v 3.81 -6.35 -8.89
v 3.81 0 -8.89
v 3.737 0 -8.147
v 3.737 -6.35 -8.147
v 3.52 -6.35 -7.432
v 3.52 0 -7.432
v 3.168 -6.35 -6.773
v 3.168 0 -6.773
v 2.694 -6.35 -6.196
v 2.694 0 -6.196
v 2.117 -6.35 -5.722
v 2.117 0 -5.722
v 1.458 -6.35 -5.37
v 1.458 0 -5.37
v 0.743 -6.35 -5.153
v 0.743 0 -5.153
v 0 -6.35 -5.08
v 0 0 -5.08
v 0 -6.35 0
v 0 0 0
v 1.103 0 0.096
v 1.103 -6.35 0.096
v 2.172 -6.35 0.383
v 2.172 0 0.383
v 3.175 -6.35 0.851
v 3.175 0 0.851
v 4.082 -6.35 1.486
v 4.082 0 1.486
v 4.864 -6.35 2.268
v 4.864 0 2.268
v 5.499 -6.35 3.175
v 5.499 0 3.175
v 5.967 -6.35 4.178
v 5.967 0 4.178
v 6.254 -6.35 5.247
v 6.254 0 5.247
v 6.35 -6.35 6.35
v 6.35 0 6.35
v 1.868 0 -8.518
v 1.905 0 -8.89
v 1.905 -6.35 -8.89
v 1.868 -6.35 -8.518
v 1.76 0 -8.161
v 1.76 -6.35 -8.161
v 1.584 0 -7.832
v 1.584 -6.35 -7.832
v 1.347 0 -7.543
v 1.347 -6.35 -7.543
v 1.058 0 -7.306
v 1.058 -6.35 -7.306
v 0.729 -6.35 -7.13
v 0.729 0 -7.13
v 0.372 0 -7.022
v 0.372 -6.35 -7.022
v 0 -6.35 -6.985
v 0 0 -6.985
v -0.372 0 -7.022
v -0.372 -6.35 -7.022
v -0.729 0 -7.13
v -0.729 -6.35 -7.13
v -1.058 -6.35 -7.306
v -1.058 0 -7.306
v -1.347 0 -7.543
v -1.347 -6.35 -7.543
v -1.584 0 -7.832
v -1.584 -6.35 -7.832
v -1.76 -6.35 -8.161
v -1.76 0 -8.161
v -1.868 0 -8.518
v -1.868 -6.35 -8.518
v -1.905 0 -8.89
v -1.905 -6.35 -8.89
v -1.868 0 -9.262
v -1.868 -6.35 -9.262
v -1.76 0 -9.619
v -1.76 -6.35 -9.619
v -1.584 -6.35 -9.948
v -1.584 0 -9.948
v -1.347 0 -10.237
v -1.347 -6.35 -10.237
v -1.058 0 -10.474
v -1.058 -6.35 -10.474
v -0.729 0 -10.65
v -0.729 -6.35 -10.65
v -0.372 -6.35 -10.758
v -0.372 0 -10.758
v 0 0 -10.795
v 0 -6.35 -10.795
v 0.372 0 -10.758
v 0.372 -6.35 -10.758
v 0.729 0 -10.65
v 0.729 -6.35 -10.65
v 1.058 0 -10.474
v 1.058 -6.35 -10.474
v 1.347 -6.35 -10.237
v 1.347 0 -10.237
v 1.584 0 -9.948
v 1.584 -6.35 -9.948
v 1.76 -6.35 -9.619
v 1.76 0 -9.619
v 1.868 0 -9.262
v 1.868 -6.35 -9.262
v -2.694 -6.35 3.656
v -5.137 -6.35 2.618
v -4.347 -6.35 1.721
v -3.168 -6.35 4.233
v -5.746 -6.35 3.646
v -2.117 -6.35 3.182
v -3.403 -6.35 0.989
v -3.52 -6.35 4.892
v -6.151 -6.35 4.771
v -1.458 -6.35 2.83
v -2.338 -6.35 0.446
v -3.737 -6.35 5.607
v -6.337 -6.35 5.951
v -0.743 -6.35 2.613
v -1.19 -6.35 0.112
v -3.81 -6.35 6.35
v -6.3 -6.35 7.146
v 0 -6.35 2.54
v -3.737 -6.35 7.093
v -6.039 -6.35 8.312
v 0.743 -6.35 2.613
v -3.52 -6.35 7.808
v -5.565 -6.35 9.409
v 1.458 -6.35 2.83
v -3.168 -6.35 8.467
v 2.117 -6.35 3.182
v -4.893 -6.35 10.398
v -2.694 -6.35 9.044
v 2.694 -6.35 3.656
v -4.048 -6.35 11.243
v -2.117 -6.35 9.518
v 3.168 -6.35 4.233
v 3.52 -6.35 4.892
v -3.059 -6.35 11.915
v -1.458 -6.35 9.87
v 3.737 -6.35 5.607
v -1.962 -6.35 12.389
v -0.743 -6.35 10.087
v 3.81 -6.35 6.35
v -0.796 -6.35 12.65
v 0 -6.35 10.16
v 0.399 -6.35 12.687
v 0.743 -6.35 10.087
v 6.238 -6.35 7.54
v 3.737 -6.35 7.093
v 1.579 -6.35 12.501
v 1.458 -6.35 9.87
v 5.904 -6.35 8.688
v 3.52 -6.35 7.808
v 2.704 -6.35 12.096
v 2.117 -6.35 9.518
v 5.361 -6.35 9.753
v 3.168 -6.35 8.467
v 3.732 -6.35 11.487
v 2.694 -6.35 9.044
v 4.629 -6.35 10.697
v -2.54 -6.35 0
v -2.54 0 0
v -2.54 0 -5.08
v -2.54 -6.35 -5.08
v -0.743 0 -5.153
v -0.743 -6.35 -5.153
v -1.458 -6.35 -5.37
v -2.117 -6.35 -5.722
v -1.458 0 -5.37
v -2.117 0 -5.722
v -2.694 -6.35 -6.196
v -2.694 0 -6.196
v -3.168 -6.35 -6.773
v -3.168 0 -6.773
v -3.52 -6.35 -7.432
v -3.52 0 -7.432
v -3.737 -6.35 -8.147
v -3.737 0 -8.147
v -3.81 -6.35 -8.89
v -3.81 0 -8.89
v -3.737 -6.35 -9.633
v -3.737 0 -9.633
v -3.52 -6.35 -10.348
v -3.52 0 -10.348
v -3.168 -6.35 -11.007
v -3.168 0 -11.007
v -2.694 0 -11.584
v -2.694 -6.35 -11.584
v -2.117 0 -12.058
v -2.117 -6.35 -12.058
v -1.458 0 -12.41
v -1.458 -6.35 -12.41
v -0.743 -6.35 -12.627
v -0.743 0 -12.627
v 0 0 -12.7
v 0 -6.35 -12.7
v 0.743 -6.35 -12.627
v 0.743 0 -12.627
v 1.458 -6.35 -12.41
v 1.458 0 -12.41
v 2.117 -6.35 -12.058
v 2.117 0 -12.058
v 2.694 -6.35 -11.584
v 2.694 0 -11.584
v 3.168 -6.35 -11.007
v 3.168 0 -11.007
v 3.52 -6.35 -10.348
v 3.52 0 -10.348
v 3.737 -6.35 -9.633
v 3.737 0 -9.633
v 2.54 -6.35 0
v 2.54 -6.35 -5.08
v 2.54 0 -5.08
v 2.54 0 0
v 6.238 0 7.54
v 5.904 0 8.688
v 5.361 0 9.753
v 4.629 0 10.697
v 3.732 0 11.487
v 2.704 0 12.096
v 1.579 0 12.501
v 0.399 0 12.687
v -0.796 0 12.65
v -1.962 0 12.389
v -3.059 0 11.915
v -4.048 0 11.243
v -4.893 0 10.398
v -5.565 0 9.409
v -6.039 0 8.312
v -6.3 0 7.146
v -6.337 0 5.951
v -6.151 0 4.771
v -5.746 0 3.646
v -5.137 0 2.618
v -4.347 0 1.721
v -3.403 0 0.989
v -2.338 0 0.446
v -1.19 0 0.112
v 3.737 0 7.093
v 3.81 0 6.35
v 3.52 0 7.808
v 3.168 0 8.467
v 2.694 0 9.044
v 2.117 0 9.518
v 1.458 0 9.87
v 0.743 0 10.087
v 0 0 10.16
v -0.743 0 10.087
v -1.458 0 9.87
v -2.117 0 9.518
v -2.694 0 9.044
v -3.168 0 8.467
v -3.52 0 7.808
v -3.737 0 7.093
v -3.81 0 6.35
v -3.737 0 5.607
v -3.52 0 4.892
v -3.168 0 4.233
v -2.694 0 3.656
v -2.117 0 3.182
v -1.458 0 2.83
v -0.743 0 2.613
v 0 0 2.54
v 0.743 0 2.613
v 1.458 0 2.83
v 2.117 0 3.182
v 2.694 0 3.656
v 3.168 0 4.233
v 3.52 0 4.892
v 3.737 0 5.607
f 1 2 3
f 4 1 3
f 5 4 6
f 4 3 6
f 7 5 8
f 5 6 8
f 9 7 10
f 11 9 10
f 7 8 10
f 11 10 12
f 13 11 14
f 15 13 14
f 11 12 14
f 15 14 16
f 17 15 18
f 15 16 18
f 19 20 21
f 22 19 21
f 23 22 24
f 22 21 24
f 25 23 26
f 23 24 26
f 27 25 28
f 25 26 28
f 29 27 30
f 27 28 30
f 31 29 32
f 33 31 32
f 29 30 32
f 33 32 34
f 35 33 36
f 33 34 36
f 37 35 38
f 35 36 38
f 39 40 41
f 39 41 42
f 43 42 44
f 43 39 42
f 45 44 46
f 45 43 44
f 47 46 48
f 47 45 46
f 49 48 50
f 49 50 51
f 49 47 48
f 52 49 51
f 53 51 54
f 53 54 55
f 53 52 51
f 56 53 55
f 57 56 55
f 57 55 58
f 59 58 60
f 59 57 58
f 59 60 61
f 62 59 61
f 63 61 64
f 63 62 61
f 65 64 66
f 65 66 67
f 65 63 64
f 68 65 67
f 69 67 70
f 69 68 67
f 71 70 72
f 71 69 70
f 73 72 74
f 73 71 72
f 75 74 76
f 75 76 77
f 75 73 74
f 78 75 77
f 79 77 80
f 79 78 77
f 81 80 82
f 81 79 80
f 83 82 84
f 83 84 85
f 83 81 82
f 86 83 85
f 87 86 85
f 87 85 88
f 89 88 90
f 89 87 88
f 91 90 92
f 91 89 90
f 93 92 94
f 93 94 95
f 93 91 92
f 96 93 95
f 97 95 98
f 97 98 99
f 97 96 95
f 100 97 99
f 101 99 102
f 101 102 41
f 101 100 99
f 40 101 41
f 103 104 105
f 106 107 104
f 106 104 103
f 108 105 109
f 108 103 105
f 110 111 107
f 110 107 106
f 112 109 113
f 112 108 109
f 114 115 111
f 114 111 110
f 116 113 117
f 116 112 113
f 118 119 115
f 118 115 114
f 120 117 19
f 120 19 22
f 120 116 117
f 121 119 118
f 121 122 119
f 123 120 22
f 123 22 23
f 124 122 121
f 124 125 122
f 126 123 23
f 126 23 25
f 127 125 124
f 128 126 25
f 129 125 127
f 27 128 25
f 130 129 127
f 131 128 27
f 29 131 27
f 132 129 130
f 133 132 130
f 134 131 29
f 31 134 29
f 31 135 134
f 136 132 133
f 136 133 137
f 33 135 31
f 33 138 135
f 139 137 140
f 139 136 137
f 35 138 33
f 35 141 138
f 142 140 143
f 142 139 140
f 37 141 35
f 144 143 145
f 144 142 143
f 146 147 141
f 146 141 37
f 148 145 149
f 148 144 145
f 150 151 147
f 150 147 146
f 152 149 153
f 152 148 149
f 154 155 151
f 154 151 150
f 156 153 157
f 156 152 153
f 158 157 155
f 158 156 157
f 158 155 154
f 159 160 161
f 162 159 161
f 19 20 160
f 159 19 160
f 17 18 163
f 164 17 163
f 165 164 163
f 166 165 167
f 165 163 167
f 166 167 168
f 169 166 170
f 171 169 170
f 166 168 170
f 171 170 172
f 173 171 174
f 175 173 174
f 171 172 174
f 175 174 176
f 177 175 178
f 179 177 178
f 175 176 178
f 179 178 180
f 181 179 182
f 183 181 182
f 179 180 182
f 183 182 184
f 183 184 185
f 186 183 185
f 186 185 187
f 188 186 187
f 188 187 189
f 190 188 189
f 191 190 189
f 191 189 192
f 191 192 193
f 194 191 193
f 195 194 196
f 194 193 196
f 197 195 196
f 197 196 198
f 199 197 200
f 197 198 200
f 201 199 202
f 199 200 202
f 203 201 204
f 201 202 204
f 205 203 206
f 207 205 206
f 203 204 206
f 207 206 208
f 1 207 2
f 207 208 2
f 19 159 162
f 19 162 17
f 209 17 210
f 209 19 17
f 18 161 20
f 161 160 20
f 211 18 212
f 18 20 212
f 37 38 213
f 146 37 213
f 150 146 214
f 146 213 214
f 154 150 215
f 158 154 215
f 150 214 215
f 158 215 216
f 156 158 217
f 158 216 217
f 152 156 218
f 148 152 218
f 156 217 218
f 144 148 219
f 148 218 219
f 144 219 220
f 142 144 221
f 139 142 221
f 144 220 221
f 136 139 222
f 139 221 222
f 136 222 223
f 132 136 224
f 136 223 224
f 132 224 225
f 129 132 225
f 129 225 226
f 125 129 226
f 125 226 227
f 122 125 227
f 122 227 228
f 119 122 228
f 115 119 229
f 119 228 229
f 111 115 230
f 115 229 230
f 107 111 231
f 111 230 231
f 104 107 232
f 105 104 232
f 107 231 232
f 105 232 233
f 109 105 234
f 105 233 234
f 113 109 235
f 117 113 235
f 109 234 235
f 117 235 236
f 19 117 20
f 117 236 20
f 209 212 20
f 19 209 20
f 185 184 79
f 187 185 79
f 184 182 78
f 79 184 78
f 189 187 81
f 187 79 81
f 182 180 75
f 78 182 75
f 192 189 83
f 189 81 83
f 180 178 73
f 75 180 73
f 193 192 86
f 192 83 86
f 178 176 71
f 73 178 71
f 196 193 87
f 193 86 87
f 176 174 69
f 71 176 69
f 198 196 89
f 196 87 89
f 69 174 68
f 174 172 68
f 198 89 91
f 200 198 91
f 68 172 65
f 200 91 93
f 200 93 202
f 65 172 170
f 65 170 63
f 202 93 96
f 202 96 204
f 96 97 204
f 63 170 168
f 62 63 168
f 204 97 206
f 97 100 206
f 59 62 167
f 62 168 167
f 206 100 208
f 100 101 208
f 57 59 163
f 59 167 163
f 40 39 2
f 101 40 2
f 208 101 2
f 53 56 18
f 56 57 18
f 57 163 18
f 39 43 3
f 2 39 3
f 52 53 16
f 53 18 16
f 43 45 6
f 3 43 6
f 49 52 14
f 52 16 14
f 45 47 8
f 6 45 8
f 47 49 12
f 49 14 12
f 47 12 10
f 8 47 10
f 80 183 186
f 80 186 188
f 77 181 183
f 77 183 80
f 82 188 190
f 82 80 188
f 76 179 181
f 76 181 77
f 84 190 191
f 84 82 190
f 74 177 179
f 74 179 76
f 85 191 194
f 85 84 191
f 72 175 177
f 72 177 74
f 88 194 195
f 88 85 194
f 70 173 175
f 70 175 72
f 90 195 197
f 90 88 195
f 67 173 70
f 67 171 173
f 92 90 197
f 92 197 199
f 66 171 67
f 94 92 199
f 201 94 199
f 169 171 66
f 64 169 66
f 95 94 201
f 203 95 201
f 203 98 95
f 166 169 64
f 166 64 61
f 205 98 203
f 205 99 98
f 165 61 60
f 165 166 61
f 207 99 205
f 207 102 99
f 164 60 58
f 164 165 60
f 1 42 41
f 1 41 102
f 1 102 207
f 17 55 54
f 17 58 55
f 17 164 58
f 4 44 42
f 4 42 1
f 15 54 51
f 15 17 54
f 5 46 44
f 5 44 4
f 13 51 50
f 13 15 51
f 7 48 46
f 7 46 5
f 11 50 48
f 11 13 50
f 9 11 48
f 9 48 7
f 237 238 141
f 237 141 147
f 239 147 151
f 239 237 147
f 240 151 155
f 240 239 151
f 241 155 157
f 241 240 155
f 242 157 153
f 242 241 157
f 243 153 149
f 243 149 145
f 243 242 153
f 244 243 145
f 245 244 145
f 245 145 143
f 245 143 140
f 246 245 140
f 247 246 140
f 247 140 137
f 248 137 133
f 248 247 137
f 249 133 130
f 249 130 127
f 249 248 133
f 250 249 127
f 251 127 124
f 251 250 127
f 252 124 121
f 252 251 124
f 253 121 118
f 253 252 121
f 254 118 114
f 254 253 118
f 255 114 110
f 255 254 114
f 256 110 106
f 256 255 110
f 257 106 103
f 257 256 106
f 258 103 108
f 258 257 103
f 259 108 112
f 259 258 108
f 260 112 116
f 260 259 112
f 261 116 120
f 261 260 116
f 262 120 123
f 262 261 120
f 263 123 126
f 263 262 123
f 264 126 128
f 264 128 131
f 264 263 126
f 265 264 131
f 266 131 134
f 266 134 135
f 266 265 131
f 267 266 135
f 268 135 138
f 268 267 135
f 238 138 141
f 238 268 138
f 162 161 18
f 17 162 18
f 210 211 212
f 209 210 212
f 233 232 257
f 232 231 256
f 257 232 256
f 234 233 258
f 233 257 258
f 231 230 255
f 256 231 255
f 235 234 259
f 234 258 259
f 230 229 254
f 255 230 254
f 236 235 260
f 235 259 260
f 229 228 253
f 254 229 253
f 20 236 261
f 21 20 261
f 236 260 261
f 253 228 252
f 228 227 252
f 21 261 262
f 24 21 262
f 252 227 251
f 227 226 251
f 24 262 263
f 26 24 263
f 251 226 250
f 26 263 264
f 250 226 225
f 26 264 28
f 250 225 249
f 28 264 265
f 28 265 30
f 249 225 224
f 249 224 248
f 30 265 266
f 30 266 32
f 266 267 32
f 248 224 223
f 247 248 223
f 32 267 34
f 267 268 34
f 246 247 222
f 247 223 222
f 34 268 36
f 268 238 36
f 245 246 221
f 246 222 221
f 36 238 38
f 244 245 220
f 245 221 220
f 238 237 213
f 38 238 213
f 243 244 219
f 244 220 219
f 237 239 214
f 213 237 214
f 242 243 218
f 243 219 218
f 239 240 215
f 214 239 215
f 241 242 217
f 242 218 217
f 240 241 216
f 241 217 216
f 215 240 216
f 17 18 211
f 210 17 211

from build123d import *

# Parameters (mm, degrees)
F0_R     = 1.905
F0_R_2   = 3.81
F1_DEPTH = 6.35


with BuildPart() as f1:
    # F0 (on Front) → F1 (new body)
    with BuildSketch(Plane.XZ):
        with BuildLine():
            ThreePointArc((0, -5.08), (-2.694077, -11.584077), (3.81, -8.89))
            ThreePointArc((3.81, -8.89), (2.694077, -6.195923), (0, -5.08))
        make_face()
        with Locations((0, -8.89)):
            Circle(F0_R, mode=Mode.SUBTRACT)
        Polygon((-2.54, -5.08), (0, -5.08), (2.54, -5.08), (2.54, 0), (0, 0), (-2.54, 0), align=None)
        with BuildLine():
            ThreePointArc((6.35, 6.35), (-4.490128, 10.840128), (0, 0))
            ThreePointArc((0, 0), (4.490128, 1.859872), (6.35, 6.35))
        make_face()
        with Locations((0, 6.35)):
            Circle(F0_R_2, mode=Mode.SUBTRACT)
    extrude(amount=F1_DEPTH)


solid = f1.part
